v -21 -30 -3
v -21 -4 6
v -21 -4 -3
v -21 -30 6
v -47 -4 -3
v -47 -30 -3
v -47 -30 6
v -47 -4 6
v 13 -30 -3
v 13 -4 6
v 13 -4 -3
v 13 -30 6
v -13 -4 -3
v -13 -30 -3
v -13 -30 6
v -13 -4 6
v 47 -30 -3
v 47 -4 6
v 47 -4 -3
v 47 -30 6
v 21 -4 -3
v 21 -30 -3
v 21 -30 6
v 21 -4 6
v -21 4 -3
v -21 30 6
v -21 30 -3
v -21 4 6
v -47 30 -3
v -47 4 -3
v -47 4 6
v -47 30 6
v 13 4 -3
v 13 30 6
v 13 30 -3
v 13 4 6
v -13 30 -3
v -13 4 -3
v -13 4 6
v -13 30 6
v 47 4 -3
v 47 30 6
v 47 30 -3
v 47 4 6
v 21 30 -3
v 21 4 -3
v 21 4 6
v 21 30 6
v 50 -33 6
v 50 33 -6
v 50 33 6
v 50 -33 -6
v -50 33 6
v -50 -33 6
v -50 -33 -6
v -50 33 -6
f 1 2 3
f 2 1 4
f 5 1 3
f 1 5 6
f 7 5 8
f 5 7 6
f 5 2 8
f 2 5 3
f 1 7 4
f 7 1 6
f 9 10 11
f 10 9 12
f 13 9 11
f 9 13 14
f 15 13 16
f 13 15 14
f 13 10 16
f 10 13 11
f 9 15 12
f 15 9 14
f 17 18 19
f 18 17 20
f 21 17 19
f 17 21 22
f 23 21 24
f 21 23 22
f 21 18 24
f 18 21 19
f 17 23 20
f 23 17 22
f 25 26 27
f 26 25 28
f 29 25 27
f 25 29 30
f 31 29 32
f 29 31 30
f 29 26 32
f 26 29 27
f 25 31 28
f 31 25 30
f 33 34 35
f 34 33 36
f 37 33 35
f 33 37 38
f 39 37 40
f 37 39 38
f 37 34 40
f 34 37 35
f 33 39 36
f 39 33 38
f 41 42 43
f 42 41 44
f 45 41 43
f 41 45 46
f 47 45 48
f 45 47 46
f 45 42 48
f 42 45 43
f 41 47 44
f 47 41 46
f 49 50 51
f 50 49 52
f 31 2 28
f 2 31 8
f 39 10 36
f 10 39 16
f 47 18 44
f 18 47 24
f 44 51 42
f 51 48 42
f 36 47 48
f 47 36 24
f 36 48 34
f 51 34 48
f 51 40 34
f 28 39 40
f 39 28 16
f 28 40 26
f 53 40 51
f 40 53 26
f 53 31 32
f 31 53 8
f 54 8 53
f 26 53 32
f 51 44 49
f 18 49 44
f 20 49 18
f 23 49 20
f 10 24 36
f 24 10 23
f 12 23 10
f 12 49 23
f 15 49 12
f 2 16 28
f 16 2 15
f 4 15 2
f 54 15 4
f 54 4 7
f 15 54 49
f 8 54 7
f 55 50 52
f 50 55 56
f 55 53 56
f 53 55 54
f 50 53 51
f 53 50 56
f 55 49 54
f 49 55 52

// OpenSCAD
$fn = 32;

// ----------------------------------------------------------------------
// Pocket plate 100 x 66 x 12
// 2 x 3 pockets 26 mm square, 9 mm deep
// ----------------------------------------------------------------------

// --- parameters (mm) ---
thickness = 12;  // plate thickness
floor_t = 3;     // material left under each pocket
pocket = 26;     // pocket side length
pitch_x = 34;    // pocket pitch along X
pitch_y = 34;    // pocket pitch along Y
cols = 3;        // pockets per row
rows = 2;        // rows of pockets

// --- derived feature positions (mm) ---
depth = thickness - floor_t;        // = 9   pocket depth, down to the floor
span_x = (cols - 1) * pitch_x;      // = 68   distance between outer pockets
span_y = (rows - 1) * pitch_y;      // = 34   distance between outer pocket rows
origin_x = -span_x / 2;             // = -34   X of the first pocket
origin_y = -span_y / 2;             // = -17   Y of the first pocket
plate = [span_x + pocket + 6, span_y + pocket + 6, thickness];  // = [100, 66, 12]   overall size: pockets plus 3 mm of wall on each side
feature_centers = [
  [origin_x + 0 * pitch_x, origin_y + 0 * pitch_y],
  [origin_x + 1 * pitch_x, origin_y + 0 * pitch_y],
  [origin_x + 2 * pitch_x, origin_y + 0 * pitch_y],
  [origin_x + 0 * pitch_x, origin_y + 1 * pitch_y],
  [origin_x + 1 * pitch_x, origin_y + 1 * pitch_y],
  [origin_x + 2 * pitch_x, origin_y + 1 * pitch_y]
];   // pocket centres, used verbatim by the cutter loop

// plate outline, then one pocket per centre in feature_centers
difference() {
  cube(plate, center = true);
  for (centre = feature_centers)
    translate([centre[0] - pocket / 2, centre[1] - pocket / 2, plate[2] / 2 - depth])
      cube([pocket, pocket, depth + 1]);  // centred on the declared pocket centre
}
